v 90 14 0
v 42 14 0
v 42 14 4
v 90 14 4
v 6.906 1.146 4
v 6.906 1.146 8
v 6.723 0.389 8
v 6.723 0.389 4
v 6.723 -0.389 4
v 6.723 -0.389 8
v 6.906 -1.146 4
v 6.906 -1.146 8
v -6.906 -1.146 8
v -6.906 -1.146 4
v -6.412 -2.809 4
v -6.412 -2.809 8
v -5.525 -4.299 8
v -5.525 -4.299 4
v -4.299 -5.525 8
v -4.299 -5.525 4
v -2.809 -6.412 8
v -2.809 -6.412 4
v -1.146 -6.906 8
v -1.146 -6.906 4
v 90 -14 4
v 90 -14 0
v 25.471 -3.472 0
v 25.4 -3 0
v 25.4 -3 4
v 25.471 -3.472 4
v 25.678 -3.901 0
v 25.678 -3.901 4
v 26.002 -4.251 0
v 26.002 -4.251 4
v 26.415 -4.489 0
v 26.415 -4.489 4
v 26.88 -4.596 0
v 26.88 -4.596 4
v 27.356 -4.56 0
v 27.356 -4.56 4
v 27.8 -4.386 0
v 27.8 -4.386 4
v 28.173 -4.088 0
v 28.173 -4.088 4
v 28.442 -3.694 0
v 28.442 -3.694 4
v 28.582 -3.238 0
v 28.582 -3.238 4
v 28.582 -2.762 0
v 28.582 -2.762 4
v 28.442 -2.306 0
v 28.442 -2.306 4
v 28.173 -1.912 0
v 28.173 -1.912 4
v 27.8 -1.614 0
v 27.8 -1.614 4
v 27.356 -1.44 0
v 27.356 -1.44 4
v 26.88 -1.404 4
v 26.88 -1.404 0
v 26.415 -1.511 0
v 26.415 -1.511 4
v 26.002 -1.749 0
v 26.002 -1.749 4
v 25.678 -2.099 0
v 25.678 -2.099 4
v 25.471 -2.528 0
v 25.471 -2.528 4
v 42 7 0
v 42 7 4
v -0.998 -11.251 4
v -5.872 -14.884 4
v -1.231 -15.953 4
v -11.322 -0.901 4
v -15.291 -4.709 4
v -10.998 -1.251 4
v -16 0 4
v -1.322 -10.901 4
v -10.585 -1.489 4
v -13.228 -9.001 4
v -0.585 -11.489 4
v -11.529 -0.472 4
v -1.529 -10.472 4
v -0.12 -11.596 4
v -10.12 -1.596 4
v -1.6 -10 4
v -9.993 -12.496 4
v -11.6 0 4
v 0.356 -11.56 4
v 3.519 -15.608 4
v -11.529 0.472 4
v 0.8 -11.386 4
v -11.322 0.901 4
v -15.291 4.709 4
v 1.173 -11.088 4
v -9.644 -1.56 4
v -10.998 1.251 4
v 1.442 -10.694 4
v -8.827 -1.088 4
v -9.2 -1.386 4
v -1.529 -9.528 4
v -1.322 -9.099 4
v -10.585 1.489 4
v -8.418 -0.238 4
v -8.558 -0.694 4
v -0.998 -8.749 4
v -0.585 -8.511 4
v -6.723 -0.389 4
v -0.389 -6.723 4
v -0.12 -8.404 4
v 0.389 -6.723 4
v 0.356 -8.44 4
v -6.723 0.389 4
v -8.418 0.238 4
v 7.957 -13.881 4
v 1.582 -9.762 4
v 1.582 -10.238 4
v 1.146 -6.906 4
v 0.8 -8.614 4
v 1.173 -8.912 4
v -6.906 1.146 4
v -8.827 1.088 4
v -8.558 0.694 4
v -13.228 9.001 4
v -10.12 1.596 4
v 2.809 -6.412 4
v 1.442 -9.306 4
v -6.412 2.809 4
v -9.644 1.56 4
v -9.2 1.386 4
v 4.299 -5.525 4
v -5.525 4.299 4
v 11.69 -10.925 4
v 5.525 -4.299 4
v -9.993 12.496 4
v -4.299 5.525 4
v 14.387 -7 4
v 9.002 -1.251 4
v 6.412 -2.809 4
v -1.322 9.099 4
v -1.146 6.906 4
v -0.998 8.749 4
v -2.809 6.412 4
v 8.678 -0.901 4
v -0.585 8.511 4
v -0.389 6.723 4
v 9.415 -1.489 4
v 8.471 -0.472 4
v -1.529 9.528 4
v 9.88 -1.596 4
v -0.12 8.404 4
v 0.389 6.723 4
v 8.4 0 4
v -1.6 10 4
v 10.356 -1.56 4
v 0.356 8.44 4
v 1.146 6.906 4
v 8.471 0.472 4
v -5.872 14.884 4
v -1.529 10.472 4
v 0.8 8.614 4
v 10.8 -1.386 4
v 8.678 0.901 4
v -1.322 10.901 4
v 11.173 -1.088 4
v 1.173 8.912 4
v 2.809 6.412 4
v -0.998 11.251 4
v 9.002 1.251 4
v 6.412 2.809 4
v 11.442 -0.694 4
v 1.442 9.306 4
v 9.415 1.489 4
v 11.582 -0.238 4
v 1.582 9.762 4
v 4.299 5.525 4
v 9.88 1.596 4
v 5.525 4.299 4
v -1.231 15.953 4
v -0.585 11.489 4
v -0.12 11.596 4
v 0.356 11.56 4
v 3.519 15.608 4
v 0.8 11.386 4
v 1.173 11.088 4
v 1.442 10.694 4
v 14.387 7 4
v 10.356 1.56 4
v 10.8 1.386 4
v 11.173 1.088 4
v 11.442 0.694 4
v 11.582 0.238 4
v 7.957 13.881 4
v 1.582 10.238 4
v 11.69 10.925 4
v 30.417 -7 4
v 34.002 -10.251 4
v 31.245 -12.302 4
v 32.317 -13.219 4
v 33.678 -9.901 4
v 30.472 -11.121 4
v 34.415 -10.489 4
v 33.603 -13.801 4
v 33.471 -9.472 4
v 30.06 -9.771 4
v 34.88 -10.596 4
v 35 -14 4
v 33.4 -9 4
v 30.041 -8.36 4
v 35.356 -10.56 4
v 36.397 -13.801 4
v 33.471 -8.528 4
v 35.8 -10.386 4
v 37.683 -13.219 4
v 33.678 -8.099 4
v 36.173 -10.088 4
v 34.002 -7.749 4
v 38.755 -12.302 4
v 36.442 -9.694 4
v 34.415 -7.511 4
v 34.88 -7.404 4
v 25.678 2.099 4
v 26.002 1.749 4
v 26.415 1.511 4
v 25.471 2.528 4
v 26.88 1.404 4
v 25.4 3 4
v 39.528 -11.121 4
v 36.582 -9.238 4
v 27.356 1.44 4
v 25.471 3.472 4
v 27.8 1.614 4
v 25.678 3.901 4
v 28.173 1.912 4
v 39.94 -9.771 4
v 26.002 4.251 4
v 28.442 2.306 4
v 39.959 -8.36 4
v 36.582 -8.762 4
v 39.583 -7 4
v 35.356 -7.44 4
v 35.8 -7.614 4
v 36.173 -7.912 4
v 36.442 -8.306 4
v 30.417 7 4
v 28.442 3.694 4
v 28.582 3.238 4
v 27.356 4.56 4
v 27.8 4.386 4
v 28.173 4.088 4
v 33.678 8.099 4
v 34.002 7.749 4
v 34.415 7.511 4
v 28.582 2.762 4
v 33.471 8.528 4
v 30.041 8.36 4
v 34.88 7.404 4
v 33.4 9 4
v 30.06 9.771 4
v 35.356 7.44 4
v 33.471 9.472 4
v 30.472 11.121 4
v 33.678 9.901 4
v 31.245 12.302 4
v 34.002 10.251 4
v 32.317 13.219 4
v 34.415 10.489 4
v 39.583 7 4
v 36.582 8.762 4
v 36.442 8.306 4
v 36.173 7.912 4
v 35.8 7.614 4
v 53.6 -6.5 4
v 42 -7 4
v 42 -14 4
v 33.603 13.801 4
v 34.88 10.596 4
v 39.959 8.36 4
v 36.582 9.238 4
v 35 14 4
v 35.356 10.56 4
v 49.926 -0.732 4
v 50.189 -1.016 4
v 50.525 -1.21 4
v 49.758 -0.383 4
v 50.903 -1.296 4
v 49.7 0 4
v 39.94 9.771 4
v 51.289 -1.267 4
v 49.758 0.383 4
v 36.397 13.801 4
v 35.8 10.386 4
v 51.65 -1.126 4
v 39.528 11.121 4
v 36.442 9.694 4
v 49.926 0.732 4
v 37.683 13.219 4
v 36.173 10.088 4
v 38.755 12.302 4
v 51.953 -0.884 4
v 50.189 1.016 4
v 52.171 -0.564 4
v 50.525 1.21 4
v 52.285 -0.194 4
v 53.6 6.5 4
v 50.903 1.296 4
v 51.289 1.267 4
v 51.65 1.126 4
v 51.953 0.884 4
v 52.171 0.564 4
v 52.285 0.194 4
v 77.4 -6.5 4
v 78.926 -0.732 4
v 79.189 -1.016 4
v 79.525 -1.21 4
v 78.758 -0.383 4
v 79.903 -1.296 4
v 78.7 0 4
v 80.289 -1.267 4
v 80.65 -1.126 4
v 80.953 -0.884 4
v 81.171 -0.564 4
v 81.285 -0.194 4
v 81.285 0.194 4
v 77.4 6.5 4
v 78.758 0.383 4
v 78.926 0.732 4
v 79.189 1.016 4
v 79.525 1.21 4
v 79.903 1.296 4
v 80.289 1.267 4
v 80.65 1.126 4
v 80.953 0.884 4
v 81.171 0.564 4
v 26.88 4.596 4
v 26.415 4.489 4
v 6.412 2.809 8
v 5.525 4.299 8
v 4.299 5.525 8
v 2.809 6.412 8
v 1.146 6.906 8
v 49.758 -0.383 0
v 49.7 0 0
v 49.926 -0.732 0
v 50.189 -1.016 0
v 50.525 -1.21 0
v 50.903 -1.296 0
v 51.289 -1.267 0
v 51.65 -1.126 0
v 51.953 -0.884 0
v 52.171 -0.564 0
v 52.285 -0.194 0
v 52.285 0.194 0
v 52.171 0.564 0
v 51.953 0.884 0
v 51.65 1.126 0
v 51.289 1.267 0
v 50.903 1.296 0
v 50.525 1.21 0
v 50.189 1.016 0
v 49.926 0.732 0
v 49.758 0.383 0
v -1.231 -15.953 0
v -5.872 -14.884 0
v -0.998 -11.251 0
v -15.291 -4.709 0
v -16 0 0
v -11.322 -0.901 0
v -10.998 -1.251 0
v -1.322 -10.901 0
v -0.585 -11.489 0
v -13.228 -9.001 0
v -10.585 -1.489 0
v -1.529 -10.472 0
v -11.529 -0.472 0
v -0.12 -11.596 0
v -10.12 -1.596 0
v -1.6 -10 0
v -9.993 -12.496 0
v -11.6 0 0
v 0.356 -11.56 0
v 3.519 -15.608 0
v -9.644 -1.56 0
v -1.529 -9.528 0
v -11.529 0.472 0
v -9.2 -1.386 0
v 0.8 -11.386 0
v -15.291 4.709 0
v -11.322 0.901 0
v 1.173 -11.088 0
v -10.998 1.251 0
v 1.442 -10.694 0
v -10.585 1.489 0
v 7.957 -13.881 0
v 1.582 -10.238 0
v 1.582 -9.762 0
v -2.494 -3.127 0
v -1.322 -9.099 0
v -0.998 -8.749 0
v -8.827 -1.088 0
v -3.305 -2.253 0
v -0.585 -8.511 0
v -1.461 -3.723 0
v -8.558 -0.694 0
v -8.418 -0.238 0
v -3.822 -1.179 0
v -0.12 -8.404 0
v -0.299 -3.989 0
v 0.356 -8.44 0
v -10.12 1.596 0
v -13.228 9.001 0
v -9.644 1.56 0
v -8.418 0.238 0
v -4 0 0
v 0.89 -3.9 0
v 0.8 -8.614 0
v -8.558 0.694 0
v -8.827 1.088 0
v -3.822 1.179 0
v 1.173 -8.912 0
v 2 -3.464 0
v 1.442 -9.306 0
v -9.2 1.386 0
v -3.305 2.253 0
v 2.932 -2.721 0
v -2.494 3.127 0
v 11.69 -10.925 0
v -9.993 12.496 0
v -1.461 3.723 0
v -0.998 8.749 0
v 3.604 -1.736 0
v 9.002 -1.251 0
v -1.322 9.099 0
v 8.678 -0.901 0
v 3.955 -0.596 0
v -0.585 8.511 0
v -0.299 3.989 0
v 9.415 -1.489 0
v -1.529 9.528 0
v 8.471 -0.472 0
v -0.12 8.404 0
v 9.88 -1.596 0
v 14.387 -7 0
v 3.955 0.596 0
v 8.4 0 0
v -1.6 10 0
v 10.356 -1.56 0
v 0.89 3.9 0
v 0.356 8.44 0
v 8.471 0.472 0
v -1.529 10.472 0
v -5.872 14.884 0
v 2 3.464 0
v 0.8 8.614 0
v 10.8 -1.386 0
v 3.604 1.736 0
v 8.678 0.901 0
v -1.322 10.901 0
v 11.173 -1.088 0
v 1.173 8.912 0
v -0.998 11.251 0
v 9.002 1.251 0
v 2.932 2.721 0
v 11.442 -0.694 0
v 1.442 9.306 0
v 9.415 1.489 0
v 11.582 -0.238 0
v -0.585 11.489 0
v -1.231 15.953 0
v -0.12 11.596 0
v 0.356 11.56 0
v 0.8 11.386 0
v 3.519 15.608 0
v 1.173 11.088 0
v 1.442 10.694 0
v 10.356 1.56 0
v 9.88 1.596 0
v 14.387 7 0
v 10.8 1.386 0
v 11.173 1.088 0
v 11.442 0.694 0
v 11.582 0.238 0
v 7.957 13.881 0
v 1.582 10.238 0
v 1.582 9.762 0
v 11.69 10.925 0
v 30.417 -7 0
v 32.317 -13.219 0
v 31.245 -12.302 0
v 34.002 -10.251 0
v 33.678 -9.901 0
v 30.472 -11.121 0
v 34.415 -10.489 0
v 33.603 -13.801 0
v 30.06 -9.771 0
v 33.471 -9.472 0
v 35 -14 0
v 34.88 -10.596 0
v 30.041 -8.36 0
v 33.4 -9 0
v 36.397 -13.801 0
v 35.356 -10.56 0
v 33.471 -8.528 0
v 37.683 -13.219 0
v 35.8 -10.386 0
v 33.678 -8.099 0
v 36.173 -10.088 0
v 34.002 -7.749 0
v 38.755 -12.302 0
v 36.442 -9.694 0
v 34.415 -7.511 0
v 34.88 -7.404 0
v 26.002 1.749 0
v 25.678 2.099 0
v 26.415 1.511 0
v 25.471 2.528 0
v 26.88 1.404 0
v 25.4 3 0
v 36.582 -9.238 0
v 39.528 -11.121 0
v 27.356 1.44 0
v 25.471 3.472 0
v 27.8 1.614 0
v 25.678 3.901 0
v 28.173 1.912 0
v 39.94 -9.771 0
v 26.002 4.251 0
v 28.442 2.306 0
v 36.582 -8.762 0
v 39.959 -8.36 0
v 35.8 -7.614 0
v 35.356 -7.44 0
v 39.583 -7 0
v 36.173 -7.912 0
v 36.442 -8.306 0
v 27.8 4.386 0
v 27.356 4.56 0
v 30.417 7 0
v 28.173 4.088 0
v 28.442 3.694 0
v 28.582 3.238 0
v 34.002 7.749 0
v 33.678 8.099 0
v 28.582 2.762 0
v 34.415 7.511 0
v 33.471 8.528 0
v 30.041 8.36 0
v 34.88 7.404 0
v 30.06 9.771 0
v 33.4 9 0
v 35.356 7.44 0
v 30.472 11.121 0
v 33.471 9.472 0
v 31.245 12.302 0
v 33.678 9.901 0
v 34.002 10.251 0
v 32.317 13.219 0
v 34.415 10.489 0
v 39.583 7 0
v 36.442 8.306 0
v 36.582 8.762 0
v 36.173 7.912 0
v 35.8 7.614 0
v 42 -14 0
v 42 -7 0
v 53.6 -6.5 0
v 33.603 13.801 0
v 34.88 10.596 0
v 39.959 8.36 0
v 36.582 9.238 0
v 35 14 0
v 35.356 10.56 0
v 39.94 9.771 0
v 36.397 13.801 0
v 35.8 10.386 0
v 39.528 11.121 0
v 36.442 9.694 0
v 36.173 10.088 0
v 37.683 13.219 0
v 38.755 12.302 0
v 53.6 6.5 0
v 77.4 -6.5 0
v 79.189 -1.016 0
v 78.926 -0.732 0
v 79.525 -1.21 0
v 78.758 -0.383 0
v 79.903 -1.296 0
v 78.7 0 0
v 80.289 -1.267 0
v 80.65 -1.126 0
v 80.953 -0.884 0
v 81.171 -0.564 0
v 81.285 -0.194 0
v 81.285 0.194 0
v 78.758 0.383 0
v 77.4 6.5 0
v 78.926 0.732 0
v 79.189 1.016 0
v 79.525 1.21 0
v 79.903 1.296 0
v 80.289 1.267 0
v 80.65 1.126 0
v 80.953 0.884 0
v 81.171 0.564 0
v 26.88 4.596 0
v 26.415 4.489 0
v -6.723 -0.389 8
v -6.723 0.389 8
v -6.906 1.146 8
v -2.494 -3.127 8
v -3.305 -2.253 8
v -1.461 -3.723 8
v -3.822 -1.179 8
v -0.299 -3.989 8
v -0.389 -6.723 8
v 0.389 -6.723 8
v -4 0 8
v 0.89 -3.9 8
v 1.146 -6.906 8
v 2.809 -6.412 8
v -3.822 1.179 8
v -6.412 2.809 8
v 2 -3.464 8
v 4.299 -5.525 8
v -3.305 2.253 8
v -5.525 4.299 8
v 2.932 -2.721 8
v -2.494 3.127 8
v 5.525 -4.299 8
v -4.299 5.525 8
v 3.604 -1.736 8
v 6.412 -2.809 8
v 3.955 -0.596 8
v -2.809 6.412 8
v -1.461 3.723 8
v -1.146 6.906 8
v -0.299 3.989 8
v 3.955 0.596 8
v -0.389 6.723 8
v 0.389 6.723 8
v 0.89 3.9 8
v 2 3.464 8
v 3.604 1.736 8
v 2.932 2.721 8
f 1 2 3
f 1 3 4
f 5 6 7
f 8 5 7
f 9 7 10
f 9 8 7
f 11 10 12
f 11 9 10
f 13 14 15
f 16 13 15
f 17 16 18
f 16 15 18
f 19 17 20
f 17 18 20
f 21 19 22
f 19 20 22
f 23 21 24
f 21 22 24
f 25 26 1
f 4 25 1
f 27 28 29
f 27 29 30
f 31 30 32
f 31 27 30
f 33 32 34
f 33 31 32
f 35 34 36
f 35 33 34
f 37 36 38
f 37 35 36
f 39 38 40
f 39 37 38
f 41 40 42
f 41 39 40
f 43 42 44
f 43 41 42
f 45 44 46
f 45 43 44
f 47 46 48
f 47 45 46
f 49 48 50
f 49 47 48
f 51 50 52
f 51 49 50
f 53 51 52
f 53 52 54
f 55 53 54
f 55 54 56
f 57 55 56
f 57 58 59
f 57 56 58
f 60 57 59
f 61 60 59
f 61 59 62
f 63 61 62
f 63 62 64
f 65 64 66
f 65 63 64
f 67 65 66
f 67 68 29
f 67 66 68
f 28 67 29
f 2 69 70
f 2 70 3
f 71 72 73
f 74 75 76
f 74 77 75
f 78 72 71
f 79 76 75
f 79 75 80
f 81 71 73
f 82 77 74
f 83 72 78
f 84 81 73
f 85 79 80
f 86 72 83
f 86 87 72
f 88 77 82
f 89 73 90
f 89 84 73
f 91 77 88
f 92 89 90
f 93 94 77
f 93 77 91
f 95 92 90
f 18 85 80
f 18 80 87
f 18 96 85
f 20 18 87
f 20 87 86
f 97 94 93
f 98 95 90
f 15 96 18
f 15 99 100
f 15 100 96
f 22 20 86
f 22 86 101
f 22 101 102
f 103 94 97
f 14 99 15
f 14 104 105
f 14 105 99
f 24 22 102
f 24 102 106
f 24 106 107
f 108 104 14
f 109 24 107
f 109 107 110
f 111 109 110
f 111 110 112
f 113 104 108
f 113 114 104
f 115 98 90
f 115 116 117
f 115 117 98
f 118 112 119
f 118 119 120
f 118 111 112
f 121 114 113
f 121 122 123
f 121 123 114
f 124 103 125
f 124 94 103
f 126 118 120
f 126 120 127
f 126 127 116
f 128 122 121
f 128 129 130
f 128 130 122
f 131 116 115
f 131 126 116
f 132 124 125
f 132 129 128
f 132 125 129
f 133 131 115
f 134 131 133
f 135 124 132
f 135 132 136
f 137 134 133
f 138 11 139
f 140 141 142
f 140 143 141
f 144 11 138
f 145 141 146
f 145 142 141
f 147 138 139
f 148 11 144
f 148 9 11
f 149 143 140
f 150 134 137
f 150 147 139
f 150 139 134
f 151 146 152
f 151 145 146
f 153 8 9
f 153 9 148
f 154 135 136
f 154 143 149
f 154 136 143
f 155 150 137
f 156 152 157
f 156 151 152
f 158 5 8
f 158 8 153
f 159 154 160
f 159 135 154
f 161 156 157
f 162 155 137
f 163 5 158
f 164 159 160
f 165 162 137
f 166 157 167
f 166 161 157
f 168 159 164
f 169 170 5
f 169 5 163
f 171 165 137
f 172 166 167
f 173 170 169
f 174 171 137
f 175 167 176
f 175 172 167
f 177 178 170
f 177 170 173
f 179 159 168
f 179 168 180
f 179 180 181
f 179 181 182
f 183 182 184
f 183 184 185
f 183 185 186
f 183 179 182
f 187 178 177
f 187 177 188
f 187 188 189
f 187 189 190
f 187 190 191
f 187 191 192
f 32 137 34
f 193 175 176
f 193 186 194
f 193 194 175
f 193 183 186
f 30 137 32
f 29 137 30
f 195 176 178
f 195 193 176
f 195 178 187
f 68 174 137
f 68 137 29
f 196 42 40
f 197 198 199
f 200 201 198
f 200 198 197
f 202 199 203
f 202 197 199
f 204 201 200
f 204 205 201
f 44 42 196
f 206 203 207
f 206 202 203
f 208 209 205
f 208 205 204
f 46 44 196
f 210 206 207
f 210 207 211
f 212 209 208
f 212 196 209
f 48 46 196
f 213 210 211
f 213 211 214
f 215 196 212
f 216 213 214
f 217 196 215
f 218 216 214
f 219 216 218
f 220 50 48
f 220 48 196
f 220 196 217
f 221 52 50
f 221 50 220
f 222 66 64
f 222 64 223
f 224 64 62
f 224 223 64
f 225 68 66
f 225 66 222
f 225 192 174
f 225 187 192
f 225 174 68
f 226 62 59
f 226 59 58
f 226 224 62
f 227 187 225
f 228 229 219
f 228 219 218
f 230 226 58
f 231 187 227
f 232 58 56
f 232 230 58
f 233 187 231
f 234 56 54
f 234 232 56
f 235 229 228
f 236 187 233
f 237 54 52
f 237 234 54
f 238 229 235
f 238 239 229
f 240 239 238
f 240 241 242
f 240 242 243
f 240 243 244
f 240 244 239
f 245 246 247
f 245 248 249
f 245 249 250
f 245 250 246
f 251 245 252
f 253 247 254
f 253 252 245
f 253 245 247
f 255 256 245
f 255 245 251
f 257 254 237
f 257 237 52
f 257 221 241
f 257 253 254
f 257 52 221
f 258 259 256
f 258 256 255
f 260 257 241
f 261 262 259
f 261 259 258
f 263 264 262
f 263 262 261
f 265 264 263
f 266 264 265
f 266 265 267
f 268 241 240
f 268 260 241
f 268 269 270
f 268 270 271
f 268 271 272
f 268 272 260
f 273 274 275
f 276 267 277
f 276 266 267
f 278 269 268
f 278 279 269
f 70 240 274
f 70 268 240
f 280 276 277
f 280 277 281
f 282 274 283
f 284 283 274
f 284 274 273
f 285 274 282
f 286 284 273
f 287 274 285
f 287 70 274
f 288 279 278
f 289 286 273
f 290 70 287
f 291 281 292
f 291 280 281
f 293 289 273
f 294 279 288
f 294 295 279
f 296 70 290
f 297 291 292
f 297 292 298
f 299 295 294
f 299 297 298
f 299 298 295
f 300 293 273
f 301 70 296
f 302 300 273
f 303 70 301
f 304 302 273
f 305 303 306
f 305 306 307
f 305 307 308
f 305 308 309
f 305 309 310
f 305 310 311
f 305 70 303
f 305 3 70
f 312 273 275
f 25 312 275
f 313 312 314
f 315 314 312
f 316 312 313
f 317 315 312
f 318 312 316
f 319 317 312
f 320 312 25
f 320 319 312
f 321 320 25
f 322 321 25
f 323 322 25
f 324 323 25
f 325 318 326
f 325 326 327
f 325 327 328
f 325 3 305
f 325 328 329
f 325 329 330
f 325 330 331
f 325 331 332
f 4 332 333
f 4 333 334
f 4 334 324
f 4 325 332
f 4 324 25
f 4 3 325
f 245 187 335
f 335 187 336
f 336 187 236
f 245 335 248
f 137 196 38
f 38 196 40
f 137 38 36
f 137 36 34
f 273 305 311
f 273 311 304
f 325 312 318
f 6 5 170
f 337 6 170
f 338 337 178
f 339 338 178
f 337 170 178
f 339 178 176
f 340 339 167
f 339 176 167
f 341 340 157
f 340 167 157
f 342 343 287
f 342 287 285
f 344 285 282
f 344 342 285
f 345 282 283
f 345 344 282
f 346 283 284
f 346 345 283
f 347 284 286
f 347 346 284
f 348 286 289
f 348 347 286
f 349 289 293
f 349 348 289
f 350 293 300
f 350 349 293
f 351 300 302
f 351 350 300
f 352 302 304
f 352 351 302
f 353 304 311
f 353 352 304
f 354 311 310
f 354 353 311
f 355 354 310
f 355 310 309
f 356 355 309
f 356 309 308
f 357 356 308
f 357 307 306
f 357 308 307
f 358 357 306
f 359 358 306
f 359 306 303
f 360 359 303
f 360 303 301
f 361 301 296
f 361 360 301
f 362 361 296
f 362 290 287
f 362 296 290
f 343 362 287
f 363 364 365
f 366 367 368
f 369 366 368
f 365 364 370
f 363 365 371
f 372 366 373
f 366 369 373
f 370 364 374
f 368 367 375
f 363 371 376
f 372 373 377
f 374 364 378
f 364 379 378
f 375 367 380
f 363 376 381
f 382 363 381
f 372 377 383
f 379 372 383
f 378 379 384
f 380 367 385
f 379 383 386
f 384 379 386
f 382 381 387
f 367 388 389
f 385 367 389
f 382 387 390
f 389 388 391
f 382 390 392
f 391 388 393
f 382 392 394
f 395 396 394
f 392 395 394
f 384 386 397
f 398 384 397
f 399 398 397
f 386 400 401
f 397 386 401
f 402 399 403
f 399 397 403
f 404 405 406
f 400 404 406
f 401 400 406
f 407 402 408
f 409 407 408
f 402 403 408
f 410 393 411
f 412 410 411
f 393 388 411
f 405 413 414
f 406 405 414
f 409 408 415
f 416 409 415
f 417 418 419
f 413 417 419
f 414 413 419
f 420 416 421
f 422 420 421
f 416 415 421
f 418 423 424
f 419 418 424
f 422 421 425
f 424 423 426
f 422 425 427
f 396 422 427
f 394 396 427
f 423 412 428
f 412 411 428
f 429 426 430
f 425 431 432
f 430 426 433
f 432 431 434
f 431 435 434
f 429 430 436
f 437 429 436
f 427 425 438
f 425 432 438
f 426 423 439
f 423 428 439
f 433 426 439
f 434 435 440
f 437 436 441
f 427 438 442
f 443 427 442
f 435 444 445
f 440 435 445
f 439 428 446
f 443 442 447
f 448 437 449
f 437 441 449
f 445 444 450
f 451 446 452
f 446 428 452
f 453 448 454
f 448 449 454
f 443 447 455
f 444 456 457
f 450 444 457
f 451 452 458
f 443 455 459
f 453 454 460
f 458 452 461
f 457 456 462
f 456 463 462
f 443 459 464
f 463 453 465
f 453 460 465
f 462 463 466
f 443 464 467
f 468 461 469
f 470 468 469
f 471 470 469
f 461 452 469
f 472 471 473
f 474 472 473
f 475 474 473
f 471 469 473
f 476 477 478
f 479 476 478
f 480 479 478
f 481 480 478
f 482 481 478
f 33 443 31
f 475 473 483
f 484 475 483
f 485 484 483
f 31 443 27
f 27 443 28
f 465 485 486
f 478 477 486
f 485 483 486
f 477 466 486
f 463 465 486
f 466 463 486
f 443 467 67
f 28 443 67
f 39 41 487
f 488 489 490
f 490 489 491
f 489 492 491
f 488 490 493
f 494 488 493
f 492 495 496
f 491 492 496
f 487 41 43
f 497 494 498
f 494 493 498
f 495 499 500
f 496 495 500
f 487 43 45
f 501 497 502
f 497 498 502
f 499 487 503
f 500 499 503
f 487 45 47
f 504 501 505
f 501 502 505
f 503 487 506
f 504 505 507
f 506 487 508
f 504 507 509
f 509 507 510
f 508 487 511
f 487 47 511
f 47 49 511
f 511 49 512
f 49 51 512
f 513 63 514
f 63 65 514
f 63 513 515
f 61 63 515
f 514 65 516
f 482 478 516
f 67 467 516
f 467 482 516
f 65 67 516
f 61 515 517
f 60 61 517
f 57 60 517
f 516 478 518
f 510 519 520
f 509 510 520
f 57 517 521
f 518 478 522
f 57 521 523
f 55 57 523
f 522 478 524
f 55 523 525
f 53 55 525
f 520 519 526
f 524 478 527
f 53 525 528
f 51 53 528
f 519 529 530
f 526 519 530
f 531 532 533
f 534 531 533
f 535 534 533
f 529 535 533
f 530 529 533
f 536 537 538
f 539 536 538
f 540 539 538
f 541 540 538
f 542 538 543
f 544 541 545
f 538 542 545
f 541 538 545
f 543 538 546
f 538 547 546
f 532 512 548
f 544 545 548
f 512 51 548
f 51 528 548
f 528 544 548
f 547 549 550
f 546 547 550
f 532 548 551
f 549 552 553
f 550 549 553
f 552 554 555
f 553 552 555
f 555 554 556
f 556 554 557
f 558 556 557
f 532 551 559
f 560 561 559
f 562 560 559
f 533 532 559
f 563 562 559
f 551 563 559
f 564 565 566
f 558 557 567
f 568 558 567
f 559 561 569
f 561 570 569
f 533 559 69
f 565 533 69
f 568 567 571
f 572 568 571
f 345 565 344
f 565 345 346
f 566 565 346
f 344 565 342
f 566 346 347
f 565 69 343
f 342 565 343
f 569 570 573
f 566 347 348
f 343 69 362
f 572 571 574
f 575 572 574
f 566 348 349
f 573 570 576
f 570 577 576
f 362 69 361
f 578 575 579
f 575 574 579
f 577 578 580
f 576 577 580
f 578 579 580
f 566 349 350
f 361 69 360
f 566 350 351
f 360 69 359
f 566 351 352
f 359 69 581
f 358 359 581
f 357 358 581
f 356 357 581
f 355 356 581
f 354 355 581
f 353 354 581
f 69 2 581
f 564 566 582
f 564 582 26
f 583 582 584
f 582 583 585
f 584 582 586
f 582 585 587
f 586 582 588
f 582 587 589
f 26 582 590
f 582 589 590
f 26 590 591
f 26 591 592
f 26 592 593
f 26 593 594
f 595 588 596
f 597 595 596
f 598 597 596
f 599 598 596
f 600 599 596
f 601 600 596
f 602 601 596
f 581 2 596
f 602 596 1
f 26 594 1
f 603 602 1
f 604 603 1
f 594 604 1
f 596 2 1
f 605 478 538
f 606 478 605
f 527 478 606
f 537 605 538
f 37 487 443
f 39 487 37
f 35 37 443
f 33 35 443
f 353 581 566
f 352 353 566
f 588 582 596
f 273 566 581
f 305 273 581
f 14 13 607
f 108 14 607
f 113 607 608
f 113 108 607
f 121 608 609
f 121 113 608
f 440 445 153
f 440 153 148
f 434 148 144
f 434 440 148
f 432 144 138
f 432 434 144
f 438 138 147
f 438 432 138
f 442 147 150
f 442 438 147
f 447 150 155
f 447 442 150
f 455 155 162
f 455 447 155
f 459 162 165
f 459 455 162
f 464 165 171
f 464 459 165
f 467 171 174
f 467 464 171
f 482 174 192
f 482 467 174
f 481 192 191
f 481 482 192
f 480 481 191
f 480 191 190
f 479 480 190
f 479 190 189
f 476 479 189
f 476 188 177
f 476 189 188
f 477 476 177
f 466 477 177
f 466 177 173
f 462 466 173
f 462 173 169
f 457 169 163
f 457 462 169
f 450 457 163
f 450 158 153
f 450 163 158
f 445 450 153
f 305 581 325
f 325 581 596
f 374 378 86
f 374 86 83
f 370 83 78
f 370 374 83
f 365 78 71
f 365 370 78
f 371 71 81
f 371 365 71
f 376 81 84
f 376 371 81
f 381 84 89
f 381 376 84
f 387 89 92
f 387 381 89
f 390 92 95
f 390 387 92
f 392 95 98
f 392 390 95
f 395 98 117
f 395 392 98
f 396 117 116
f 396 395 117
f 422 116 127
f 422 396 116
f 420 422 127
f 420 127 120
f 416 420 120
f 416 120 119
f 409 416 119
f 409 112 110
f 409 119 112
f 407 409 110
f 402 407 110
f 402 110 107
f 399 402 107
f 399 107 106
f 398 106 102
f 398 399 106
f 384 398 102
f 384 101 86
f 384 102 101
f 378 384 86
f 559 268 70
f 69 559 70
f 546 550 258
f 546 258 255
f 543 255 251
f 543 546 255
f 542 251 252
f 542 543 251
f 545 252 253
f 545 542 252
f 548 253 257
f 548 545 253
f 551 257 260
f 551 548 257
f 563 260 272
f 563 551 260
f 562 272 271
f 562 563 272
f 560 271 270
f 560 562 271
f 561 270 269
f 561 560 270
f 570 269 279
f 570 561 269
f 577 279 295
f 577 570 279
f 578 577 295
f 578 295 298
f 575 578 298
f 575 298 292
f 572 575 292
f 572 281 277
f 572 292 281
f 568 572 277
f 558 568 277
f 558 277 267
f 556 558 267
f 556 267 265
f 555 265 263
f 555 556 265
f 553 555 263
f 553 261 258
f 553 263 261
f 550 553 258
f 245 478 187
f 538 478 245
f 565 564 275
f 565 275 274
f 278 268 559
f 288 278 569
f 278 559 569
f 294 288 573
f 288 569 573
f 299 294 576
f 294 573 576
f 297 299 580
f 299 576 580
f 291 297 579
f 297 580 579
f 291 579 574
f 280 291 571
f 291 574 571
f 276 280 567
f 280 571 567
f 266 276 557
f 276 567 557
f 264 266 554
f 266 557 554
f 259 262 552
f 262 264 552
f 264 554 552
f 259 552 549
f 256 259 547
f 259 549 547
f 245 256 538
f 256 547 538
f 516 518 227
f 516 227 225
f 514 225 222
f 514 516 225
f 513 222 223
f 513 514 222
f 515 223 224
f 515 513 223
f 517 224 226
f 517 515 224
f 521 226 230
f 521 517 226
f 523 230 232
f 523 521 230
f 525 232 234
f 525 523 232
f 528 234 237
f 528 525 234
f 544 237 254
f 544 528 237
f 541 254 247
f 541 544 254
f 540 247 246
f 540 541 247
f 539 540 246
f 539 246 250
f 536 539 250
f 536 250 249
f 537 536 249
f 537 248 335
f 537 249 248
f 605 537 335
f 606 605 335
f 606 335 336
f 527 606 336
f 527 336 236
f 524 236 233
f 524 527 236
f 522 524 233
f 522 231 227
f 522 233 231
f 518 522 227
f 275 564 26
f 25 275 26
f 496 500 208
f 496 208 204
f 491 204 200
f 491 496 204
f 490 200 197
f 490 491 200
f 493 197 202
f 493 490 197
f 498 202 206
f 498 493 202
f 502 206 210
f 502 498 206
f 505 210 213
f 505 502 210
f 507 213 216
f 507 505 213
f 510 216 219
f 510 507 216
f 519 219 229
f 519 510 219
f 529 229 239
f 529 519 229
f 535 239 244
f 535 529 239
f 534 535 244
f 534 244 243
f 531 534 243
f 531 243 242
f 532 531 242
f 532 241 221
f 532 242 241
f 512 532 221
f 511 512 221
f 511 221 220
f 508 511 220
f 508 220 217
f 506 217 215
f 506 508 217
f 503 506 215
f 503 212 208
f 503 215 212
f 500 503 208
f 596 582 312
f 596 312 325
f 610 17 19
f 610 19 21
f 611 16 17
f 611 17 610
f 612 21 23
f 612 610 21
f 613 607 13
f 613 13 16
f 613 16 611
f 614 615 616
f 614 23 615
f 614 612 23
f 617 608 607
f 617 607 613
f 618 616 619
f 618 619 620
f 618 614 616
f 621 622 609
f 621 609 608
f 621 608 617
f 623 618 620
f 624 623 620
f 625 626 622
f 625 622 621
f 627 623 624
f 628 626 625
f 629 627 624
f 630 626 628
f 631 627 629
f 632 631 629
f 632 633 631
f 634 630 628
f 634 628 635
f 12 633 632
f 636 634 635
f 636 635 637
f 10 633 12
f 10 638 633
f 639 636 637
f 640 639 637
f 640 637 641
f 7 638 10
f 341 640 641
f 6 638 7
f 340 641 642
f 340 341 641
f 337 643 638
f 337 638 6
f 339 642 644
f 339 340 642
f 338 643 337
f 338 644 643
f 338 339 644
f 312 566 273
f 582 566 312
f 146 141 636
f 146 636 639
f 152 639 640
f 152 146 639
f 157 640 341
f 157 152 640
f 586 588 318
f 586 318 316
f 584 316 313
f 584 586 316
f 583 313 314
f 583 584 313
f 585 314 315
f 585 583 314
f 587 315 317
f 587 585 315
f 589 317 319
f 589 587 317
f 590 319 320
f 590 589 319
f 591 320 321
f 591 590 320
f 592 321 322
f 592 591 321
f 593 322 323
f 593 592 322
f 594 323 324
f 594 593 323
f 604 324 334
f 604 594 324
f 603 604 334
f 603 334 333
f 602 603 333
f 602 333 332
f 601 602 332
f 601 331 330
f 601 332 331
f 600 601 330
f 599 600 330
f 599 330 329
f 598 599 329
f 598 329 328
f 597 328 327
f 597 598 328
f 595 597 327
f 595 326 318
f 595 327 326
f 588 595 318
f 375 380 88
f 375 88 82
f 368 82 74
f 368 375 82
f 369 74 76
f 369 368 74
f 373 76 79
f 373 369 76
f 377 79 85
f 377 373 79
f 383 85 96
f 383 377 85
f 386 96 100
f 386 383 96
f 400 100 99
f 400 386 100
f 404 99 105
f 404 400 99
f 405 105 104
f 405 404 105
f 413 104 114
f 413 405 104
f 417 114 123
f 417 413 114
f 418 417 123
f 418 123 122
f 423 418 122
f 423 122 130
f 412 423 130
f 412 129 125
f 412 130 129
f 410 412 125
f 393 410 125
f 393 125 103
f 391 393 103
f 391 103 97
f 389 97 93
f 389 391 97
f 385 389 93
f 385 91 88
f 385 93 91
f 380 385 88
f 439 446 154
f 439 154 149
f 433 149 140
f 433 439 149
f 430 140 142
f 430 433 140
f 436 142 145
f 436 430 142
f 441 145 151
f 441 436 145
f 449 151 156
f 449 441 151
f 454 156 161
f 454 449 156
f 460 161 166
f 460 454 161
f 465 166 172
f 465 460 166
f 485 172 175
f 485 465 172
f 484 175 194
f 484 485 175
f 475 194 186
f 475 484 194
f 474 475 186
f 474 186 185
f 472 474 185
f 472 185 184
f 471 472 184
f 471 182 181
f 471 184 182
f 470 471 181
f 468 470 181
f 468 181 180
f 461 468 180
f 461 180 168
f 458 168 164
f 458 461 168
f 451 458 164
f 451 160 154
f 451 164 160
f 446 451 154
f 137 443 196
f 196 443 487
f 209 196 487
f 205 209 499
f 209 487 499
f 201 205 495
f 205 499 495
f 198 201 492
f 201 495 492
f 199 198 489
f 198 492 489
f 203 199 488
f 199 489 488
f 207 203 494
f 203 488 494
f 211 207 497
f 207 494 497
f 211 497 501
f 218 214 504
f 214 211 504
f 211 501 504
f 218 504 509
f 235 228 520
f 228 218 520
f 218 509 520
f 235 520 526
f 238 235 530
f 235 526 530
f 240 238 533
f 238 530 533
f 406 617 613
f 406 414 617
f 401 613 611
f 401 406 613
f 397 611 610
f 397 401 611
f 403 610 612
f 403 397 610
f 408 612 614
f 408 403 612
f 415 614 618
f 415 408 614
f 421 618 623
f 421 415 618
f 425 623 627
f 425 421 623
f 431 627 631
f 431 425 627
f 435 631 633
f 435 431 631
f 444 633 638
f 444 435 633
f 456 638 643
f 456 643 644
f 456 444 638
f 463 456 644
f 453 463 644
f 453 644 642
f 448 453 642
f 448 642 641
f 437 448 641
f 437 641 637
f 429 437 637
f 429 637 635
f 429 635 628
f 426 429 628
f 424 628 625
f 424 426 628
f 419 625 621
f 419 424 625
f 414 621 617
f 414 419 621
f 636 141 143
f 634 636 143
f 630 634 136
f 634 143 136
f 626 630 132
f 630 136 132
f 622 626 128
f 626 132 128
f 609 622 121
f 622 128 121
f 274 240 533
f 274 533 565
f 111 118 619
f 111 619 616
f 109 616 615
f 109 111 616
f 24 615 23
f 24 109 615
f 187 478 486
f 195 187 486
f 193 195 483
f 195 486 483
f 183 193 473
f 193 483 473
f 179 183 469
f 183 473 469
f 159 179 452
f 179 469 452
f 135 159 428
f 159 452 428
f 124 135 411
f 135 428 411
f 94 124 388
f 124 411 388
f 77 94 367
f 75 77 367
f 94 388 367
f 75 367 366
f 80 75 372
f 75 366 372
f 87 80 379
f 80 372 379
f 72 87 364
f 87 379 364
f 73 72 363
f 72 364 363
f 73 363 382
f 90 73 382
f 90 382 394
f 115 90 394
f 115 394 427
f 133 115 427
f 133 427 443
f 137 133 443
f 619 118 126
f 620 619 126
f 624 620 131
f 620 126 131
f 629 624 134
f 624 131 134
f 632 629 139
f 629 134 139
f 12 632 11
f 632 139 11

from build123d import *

# Parameters (mm, degrees)
MAIN_WEB_PROFILE_W                        = 60
MAIN_WEB_PROFILE_H                        = 14
MAIN_WEB_DEPTH                            = 4
SHOULDER_HORN_FLANGE_PROFILE_R            = 16
SHOULDER_HORN_FLANGE_DEPTH                = 4
ELBOW_SERVO_MOUNT_PROFILE_W               = 48
ELBOW_SERVO_MOUNT_PROFILE_H               = 28
ELBOW_SERVO_MOUNT_DEPTH                   = 4
SG90_BODY_CLEARANCE_START                 = -5
SG90_BODY_CLEARANCE_PROFILE_W             = 23.8
SG90_BODY_CLEARANCE_PROFILE_H             = 13
SG90_BODY_CLEARANCE_DEPTH                 = 97.49863387
ELBOW_TAB_FASTENERS_START                 = -50
ELBOW_TAB_FASTENERS_PROFILE_R             = 1.3
ELBOW_TAB_FASTENERS_DEPTH                 = 142.49863387
SHOULDER_CENTER_SCREW_ACCESS_START        = -50
SHOULDER_CENTER_SCREW_ACCESS_PROFILE_R    = 4
SHOULDER_CENTER_SCREW_ACCESS_DEPTH        = 142.49863387
SHOULDER_HORN_BOLT_PATTERN_START          = -50
SHOULDER_HORN_BOLT_PATTERN_PROFILE_R      = 1.6
SHOULDER_HORN_BOLT_PATTERN_DEPTH          = 142.49863387
CABLE_TIE_HOLES_START                     = -50
CABLE_TIE_HOLES_PROFILE_R                 = 1.6
CABLE_TIE_HOLES_DEPTH                     = 142.49863387
PASSIVE_LOWER_MOUNT_BOSS_PROFILE_R        = 5
PASSIVE_LOWER_MOUNT_BOSS_DEPTH            = 4
PASSIVE_UPPER_MOUNT_BOSS_PROFILE_R        = 5
PASSIVE_UPPER_MOUNT_BOSS_DEPTH            = 4
PASSIVE_CHEEK_STANDOFFS_START             = -50
PASSIVE_CHEEK_STANDOFFS_PROFILE_R         = 1.6
PASSIVE_CHEEK_STANDOFFS_DEPTH             = 142.49863387
SHOULDER_DOWEL_SUPPORT_HUB_START          = 4
SHOULDER_DOWEL_SUPPORT_HUB_PROFILE_R      = 7
SHOULDER_DOWEL_SUPPORT_HUB_PROFILE_R_2    = 4
SHOULDER_DOWEL_SUPPORT_HUB_DEPTH          = 4
SHOULDER_HORN_WASHER_HUB_RELIEF_START     = 4
SHOULDER_HORN_WASHER_HUB_RELIEF_PROFILE_R = 3.3
SHOULDER_HORN_WASHER_HUB_RELIEF_DEPTH     = 4


with BuildPart() as part:
    # Main_web_profile → Main_web (new body)
    with BuildSketch(Plane.XY):
        with Locations((30, 0)):
            Rectangle(MAIN_WEB_PROFILE_W, MAIN_WEB_PROFILE_H)
    extrude(amount=MAIN_WEB_DEPTH)

    # Shoulder_horn_flange_profile → Shoulder_horn_flange (add)
    with BuildSketch(Plane.XY):
        Circle(SHOULDER_HORN_FLANGE_PROFILE_R)
    extrude(amount=SHOULDER_HORN_FLANGE_DEPTH)

    # Elbow_servo_mount_profile → Elbow_servo_mount (add)
    with BuildSketch(Plane.XY):
        with Locations((66, 0)):
            Rectangle(ELBOW_SERVO_MOUNT_PROFILE_W, ELBOW_SERVO_MOUNT_PROFILE_H)
    extrude(amount=ELBOW_SERVO_MOUNT_DEPTH)

    # SG90_body_clearance_profile → SG90_body_clearance (cut, through all)
    with BuildSketch(Plane.XY.offset(SG90_BODY_CLEARANCE_START)):
        with Locations((65.5, 0)):
            Rectangle(SG90_BODY_CLEARANCE_PROFILE_W, SG90_BODY_CLEARANCE_PROFILE_H)
    extrude(amount=SG90_BODY_CLEARANCE_DEPTH, mode=Mode.SUBTRACT)

    # Elbow_tab_fasteners_profile → Elbow_tab_fasteners (cut, through all)
    with BuildSketch(Plane.XY.offset(ELBOW_TAB_FASTENERS_START)):
        with Locations(Location((51, 0, 0), (0, 0, 180))):
            Circle(ELBOW_TAB_FASTENERS_PROFILE_R)
        with Locations(Location((80, 0, 0), (0, 0, 180))):
            Circle(ELBOW_TAB_FASTENERS_PROFILE_R)
    extrude(amount=ELBOW_TAB_FASTENERS_DEPTH, mode=Mode.SUBTRACT)

    # Shoulder_center_screw_access_profile → Shoulder_center_screw_access (cut, through all)
    with BuildSketch(Plane.XY.offset(SHOULDER_CENTER_SCREW_ACCESS_START)):
        with Locations(Location((0, 0, 0), (0, 0, 180))):
            Circle(SHOULDER_CENTER_SCREW_ACCESS_PROFILE_R)
    extrude(amount=SHOULDER_CENTER_SCREW_ACCESS_DEPTH, mode=Mode.SUBTRACT)

    # Shoulder_horn_bolt_pattern_profile → Shoulder_horn_bolt_pattern (cut, through all)
    with BuildSketch(Plane.XY.offset(SHOULDER_HORN_BOLT_PATTERN_START)):
        with Locations(Location((0, 10, 0), (0, 0, 180))):
            Circle(SHOULDER_HORN_BOLT_PATTERN_PROFILE_R)
        with Locations(Location((0, -10, 0), (0, 0, 180))):
            Circle(SHOULDER_HORN_BOLT_PATTERN_PROFILE_R)
        with Locations(Location((10, 0, 0), (0, 0, 180))):
            Circle(SHOULDER_HORN_BOLT_PATTERN_PROFILE_R)
        with Locations(Location((-10, 0, 0), (0, 0, 180))):
            Circle(SHOULDER_HORN_BOLT_PATTERN_PROFILE_R)
    extrude(amount=SHOULDER_HORN_BOLT_PATTERN_DEPTH, mode=Mode.SUBTRACT)

    # Cable_tie_holes_profile → Cable_tie_holes (cut, through all)
    with BuildSketch(Plane.XY.offset(CABLE_TIE_HOLES_START)):
        with Locations(Location((27, -3, 0), (0, 0, 180))):
            Circle(CABLE_TIE_HOLES_PROFILE_R)
        with Locations(Location((27, 3, 0), (0, 0, 180))):
            Circle(CABLE_TIE_HOLES_PROFILE_R)
    extrude(amount=CABLE_TIE_HOLES_DEPTH, mode=Mode.SUBTRACT)

    # Passive_lower_mount_boss_profile → Passive_lower_mount_boss (add)
    with BuildSketch(Plane.XY):
        with Locations((35, -9)):
            Circle(PASSIVE_LOWER_MOUNT_BOSS_PROFILE_R)
    extrude(amount=PASSIVE_LOWER_MOUNT_BOSS_DEPTH)

    # Passive_upper_mount_boss_profile → Passive_upper_mount_boss (add)
    with BuildSketch(Plane.XY):
        with Locations((35, 9)):
            Circle(PASSIVE_UPPER_MOUNT_BOSS_PROFILE_R)
    extrude(amount=PASSIVE_UPPER_MOUNT_BOSS_DEPTH)

    # Passive_cheek_standoffs_profile → Passive_cheek_standoffs (cut, through all)
    with BuildSketch(Plane.XY.offset(PASSIVE_CHEEK_STANDOFFS_START)):
        with Locations(Location((35, -9, 0), (0, 0, 180))):
            Circle(PASSIVE_CHEEK_STANDOFFS_PROFILE_R)
        with Locations(Location((35, 9, 0), (0, 0, 180))):
            Circle(PASSIVE_CHEEK_STANDOFFS_PROFILE_R)
    extrude(amount=PASSIVE_CHEEK_STANDOFFS_DEPTH, mode=Mode.SUBTRACT)

    # Shoulder_dowel_support_hub_profile → Shoulder_dowel_support_hub (add)
    with BuildSketch(Plane.XY.offset(SHOULDER_DOWEL_SUPPORT_HUB_START)):
        Circle(SHOULDER_DOWEL_SUPPORT_HUB_PROFILE_R)
        with Locations(Location((0, 0, 0), (0, 0, 180))):
            Circle(SHOULDER_DOWEL_SUPPORT_HUB_PROFILE_R_2, mode=Mode.SUBTRACT)
    extrude(amount=SHOULDER_DOWEL_SUPPORT_HUB_DEPTH)

    # Shoulder_horn_washer_hub_relief_profile → Shoulder_horn_washer_hub_relief (cut)
    with BuildSketch(Plane.XY.offset(SHOULDER_HORN_WASHER_HUB_RELIEF_START)):
        with Locations((10, 0)):
            Circle(SHOULDER_HORN_WASHER_HUB_RELIEF_PROFILE_R)
        with Locations((-10, 0)):
            Circle(SHOULDER_HORN_WASHER_HUB_RELIEF_PROFILE_R)
        with Locations((0, 10)):
            Circle(SHOULDER_HORN_WASHER_HUB_RELIEF_PROFILE_R)
        with Locations((0, -10)):
            Circle(SHOULDER_HORN_WASHER_HUB_RELIEF_PROFILE_R)
    extrude(amount=SHOULDER_HORN_WASHER_HUB_RELIEF_DEPTH, mode=Mode.SUBTRACT)


solid = part.part
